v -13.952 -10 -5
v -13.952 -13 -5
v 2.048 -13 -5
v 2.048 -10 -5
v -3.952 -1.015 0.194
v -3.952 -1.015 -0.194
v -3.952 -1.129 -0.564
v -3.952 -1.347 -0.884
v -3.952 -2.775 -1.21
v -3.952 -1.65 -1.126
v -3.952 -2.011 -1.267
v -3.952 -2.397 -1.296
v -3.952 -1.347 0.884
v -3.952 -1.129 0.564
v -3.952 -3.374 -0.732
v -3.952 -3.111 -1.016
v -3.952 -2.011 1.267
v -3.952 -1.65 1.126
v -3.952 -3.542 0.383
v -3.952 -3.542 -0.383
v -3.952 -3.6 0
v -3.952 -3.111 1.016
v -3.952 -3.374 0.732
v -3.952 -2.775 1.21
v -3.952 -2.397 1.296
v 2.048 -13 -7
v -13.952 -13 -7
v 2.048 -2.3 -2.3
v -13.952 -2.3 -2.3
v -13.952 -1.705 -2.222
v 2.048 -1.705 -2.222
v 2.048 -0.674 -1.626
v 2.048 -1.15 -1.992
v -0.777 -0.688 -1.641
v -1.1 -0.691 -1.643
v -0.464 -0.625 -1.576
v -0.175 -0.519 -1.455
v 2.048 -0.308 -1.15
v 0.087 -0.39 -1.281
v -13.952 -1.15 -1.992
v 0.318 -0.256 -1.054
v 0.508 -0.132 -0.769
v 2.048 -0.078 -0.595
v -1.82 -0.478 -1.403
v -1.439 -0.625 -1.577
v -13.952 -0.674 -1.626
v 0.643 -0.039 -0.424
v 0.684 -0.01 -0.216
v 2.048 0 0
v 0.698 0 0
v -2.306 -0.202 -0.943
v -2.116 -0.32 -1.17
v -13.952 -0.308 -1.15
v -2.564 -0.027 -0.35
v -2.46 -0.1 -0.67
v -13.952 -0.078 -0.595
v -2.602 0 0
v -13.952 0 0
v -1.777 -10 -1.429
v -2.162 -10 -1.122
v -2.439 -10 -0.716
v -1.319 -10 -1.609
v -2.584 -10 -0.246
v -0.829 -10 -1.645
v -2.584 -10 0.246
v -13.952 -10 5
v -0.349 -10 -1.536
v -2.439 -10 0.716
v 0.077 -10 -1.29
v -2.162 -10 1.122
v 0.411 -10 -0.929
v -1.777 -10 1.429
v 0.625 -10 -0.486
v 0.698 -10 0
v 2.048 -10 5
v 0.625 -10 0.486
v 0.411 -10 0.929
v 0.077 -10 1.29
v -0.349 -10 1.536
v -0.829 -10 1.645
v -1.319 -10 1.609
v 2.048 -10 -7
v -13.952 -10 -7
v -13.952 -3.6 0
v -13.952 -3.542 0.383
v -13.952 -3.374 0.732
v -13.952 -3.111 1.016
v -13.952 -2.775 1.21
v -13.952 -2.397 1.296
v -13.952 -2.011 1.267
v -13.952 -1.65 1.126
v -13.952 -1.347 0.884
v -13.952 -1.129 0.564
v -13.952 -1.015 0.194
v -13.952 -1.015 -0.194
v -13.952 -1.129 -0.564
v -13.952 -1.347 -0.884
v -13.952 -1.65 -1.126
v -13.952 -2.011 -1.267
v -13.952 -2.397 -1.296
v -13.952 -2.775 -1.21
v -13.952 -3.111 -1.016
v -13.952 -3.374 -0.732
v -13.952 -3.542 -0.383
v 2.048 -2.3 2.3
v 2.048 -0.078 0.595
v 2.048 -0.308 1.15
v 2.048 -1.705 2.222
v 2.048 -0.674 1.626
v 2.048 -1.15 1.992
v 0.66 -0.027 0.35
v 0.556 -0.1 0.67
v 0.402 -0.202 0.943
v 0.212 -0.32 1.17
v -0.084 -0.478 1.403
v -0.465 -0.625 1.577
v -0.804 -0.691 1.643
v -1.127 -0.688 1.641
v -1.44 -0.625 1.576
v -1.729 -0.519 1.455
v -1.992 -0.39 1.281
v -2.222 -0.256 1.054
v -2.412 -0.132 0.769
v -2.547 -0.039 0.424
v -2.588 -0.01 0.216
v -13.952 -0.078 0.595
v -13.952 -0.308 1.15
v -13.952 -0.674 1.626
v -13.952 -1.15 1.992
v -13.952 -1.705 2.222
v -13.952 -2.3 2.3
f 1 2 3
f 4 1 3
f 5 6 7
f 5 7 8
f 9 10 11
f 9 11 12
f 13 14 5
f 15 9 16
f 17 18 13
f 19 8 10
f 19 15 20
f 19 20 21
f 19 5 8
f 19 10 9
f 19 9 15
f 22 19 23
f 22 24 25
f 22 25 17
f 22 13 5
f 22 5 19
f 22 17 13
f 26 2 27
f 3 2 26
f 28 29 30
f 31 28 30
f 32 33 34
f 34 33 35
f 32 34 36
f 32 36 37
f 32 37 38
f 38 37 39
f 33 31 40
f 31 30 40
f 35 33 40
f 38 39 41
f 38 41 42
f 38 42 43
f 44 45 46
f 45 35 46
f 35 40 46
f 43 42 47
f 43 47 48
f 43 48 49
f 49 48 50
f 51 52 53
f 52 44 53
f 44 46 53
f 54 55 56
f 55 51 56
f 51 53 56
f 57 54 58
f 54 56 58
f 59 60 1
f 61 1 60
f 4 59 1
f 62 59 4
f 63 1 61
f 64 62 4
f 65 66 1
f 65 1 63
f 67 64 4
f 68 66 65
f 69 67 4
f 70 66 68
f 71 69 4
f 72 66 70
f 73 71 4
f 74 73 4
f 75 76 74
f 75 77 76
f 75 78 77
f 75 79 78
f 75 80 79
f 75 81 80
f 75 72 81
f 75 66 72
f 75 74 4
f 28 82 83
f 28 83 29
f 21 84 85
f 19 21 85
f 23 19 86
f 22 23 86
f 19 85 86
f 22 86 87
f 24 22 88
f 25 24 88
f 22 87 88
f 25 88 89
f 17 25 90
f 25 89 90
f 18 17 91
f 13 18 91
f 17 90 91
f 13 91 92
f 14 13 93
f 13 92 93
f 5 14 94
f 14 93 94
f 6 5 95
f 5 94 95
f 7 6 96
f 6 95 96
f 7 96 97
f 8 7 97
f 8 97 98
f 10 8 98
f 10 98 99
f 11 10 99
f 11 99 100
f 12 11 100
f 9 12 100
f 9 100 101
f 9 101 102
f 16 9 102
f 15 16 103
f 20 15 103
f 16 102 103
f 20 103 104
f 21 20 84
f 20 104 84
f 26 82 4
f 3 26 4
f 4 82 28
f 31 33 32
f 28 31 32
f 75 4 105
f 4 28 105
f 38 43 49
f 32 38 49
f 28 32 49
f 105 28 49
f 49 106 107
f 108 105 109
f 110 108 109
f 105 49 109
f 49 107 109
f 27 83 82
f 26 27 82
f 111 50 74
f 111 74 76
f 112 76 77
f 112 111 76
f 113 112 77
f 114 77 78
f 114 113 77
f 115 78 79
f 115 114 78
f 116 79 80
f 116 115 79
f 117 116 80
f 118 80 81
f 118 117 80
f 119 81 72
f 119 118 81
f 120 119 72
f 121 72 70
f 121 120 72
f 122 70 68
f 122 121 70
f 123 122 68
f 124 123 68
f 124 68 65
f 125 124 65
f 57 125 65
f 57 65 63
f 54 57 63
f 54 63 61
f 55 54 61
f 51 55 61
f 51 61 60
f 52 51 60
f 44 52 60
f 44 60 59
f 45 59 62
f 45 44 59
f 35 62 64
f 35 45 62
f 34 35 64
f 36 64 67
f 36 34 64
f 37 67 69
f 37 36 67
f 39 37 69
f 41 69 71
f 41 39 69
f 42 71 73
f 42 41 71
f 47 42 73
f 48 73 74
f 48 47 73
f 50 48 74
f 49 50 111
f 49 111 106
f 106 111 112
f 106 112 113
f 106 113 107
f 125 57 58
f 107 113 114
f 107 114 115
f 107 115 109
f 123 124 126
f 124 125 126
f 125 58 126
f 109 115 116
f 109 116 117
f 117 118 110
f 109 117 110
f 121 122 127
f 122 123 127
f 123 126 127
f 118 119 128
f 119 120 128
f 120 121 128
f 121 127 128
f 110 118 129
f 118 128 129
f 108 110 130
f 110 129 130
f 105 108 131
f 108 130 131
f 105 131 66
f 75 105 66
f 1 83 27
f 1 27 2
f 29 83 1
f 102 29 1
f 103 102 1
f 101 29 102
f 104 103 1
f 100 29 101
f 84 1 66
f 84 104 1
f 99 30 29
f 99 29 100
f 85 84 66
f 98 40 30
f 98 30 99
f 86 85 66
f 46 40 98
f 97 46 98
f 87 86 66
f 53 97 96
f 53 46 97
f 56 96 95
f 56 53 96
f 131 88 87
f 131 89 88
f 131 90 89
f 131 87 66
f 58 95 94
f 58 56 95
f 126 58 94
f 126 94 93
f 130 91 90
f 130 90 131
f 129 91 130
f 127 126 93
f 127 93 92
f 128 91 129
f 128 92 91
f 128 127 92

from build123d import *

# Parameters (mm, degrees)
F0_W     = 16
F0_H     = 12
F0_R     = 1.65
F1_DEPTH = 13
F2_W     = 16
F2_H     = 10
F2_R     = 1.65
F3_DEPTH = 3
F5_DEPTH = 16.001
F6_R     = 1.3
F7_DEPTH = 10


with BuildPart() as f1:
    # F0 (on Front) → F1 (new body)
    with BuildSketch(Plane.XZ):
        with Locations((-5.952034, -1)):
            Rectangle(F0_W, F0_H)
        with Locations((-0.952034, 0)):
            Circle(F0_R, mode=Mode.SUBTRACT)
    extrude(amount=F1_DEPTH)

    # F2 (on face) → F3 (cut)
    with BuildSketch(Plane.XZ.offset(13)):
        with Locations((-5.952034, 0)):
            Rectangle(F2_W, F2_H)
        with Locations((-0.952034, 0)):
            Circle(F2_R, mode=Mode.SUBTRACT)
    extrude(amount=-F3_DEPTH, mode=Mode.SUBTRACT)

    # F4 (on face) → F5 (cut, through all)
    with BuildSketch(Plane(origin=(-13.952034, 0, 0), x_dir=(0, -1, 0), z_dir=(-1, 0, 0))):
        with BuildLine():
            ThreePointArc((0, 0), (0.673654, 1.626346), (2.3, 2.3))
            Line((2.3, 2.3), (10, 5))
            Line((10, 5), (0, 5))
            Line((0, 5), (0, 0))
        make_face()
        with BuildLine():
            Line((10, -7), (2.3, -2.3))
            ThreePointArc((2.3, -2.3), (0.673654, -1.626346), (0, 0))
            Line((0, 0), (0, -7))
            Line((0, -7), (10, -7))
        make_face()
    extrude(amount=-F5_DEPTH, mode=Mode.SUBTRACT)

    # F6 (on face) → F7 (cut)
    with BuildSketch(Plane(origin=(-13.952034, 0, 0), x_dir=(0, -1, 0), z_dir=(-1, 0, 0))):
        with Locations((2.3, 0)):
            Circle(F6_R)
    extrude(amount=-F7_DEPTH, mode=Mode.SUBTRACT)


solid = f1.part
